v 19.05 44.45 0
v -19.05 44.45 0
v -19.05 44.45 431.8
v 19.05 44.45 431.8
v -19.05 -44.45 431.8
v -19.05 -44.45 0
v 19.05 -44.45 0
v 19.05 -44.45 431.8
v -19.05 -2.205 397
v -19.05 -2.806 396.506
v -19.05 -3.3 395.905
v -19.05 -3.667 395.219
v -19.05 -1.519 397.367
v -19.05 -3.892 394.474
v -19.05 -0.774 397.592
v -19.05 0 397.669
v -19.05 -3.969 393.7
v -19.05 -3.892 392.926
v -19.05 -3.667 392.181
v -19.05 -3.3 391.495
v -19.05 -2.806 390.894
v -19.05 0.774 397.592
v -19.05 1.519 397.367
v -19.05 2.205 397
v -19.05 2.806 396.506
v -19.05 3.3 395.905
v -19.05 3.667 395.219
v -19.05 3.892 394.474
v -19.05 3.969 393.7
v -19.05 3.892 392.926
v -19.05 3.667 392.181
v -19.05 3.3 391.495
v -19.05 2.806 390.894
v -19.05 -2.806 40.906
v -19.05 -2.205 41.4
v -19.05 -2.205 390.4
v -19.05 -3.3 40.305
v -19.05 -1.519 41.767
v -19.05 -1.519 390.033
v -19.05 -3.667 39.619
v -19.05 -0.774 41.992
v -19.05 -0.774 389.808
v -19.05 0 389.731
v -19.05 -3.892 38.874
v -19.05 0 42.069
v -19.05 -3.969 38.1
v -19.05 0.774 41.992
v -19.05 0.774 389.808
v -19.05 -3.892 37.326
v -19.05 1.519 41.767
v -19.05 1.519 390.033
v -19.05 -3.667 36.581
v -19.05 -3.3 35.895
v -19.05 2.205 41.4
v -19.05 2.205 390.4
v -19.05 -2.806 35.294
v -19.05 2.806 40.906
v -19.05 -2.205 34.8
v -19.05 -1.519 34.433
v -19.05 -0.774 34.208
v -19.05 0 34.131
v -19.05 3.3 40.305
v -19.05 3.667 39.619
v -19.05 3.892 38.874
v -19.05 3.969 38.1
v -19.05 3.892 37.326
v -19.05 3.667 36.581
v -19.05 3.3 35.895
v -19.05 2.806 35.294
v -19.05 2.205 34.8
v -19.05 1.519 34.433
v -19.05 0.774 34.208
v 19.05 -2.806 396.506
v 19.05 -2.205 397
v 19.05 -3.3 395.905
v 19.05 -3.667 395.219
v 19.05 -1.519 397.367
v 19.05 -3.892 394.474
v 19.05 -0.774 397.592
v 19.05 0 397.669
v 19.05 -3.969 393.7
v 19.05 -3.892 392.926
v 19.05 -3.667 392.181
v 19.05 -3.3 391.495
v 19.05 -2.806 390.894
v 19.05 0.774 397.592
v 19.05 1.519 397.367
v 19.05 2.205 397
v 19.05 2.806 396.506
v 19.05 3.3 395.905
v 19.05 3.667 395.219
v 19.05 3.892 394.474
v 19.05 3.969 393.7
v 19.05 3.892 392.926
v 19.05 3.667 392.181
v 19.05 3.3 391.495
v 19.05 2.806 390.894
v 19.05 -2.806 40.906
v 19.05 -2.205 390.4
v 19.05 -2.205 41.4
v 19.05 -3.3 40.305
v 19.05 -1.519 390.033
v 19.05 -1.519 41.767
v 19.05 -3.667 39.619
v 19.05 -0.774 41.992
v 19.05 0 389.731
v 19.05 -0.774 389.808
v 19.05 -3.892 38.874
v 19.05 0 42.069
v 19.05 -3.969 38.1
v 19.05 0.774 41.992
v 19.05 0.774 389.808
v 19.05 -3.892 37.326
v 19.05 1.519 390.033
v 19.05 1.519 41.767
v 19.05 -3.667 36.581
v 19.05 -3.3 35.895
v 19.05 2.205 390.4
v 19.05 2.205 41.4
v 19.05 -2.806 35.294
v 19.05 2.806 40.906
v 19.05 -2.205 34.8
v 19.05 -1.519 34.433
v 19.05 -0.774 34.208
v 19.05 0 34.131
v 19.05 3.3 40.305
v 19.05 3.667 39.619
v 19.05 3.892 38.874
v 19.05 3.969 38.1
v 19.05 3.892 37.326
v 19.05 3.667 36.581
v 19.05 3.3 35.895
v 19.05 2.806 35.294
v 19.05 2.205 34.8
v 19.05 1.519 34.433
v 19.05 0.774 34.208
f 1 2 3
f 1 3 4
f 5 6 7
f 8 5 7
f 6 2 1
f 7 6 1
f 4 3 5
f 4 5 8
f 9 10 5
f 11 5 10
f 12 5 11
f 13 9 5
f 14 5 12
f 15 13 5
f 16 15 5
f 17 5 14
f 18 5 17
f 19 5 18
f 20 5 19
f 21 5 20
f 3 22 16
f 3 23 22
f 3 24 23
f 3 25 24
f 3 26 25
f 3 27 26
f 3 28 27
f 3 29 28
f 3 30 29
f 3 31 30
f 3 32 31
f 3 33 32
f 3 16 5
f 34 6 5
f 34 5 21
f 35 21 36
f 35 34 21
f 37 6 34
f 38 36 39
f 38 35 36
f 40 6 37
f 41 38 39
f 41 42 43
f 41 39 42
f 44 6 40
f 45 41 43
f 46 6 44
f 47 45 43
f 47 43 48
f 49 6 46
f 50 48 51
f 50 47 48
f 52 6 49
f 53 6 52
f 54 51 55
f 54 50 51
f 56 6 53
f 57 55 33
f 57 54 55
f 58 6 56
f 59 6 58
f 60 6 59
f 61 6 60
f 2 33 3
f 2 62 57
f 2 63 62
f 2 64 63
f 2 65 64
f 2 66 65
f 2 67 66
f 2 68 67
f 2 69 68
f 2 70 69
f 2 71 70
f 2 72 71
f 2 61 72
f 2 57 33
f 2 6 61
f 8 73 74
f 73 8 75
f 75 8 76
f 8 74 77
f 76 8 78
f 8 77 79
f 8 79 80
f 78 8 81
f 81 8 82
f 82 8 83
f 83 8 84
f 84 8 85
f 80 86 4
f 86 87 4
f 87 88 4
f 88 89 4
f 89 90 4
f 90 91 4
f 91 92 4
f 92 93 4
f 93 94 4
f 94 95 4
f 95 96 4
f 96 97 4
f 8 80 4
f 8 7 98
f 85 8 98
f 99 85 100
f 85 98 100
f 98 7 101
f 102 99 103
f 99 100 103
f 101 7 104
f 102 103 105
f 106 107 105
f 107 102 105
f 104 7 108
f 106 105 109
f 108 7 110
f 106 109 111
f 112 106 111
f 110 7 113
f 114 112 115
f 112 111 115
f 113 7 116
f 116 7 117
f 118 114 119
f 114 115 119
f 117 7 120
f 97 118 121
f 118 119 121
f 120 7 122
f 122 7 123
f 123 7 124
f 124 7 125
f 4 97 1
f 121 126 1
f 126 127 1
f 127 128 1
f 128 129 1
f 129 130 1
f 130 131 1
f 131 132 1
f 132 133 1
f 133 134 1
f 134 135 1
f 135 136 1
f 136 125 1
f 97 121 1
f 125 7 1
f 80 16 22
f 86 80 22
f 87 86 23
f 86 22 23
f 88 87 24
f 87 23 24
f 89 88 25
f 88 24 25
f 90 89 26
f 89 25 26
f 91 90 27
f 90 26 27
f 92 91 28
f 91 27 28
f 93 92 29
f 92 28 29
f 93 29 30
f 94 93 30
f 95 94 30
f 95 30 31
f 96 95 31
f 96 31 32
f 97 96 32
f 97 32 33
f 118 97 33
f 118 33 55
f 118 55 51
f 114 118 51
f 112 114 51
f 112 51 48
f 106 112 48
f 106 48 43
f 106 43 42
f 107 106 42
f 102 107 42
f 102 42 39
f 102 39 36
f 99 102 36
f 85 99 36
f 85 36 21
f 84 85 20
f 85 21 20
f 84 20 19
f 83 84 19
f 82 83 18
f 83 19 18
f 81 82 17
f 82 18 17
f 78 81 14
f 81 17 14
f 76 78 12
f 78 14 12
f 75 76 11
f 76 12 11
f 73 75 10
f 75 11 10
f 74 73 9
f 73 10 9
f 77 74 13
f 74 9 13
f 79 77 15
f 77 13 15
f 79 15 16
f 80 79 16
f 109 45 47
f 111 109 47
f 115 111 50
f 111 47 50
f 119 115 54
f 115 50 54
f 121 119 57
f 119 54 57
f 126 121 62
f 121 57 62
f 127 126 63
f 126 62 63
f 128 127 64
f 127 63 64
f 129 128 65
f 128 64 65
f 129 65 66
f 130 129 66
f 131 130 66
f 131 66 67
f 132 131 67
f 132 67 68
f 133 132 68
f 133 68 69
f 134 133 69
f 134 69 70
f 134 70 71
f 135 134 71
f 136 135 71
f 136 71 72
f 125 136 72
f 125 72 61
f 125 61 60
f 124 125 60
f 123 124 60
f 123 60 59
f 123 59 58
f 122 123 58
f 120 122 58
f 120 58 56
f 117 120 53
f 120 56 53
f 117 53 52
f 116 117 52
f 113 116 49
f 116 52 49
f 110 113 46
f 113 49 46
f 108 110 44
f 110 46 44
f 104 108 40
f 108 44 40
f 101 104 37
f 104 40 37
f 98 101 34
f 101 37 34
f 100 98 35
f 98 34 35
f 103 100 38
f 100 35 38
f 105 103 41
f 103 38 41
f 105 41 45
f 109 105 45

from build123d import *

# Parameters (mm, degrees)
SKETCH1_W                      = 38.1
SKETCH1_H                      = 88.9
BOSS_EXTRUDE1_DEPTH            = 431.8
F_5_16_0_3125_DIAMETER_HOLE1_D = 7.9375


with BuildPart() as part:
    # Sketch1 → Boss-Extrude1 (new body)
    with BuildSketch(Plane.XY):
        Rectangle(SKETCH1_W, SKETCH1_H)
    extrude(amount=BOSS_EXTRUDE1_DEPTH)

    # 5/16 (0.3125) Diameter Hole1 (through all)
    with Locations(Plane(origin=(19.05, 0, 0), x_dir=(0, 0, -1), z_dir=(1, 0, 0))):
        with Locations((-393.7, 0), (-38.1, 0)):
            Hole(F_5_16_0_3125_DIAMETER_HOLE1_D / 2)


solid = part.part
